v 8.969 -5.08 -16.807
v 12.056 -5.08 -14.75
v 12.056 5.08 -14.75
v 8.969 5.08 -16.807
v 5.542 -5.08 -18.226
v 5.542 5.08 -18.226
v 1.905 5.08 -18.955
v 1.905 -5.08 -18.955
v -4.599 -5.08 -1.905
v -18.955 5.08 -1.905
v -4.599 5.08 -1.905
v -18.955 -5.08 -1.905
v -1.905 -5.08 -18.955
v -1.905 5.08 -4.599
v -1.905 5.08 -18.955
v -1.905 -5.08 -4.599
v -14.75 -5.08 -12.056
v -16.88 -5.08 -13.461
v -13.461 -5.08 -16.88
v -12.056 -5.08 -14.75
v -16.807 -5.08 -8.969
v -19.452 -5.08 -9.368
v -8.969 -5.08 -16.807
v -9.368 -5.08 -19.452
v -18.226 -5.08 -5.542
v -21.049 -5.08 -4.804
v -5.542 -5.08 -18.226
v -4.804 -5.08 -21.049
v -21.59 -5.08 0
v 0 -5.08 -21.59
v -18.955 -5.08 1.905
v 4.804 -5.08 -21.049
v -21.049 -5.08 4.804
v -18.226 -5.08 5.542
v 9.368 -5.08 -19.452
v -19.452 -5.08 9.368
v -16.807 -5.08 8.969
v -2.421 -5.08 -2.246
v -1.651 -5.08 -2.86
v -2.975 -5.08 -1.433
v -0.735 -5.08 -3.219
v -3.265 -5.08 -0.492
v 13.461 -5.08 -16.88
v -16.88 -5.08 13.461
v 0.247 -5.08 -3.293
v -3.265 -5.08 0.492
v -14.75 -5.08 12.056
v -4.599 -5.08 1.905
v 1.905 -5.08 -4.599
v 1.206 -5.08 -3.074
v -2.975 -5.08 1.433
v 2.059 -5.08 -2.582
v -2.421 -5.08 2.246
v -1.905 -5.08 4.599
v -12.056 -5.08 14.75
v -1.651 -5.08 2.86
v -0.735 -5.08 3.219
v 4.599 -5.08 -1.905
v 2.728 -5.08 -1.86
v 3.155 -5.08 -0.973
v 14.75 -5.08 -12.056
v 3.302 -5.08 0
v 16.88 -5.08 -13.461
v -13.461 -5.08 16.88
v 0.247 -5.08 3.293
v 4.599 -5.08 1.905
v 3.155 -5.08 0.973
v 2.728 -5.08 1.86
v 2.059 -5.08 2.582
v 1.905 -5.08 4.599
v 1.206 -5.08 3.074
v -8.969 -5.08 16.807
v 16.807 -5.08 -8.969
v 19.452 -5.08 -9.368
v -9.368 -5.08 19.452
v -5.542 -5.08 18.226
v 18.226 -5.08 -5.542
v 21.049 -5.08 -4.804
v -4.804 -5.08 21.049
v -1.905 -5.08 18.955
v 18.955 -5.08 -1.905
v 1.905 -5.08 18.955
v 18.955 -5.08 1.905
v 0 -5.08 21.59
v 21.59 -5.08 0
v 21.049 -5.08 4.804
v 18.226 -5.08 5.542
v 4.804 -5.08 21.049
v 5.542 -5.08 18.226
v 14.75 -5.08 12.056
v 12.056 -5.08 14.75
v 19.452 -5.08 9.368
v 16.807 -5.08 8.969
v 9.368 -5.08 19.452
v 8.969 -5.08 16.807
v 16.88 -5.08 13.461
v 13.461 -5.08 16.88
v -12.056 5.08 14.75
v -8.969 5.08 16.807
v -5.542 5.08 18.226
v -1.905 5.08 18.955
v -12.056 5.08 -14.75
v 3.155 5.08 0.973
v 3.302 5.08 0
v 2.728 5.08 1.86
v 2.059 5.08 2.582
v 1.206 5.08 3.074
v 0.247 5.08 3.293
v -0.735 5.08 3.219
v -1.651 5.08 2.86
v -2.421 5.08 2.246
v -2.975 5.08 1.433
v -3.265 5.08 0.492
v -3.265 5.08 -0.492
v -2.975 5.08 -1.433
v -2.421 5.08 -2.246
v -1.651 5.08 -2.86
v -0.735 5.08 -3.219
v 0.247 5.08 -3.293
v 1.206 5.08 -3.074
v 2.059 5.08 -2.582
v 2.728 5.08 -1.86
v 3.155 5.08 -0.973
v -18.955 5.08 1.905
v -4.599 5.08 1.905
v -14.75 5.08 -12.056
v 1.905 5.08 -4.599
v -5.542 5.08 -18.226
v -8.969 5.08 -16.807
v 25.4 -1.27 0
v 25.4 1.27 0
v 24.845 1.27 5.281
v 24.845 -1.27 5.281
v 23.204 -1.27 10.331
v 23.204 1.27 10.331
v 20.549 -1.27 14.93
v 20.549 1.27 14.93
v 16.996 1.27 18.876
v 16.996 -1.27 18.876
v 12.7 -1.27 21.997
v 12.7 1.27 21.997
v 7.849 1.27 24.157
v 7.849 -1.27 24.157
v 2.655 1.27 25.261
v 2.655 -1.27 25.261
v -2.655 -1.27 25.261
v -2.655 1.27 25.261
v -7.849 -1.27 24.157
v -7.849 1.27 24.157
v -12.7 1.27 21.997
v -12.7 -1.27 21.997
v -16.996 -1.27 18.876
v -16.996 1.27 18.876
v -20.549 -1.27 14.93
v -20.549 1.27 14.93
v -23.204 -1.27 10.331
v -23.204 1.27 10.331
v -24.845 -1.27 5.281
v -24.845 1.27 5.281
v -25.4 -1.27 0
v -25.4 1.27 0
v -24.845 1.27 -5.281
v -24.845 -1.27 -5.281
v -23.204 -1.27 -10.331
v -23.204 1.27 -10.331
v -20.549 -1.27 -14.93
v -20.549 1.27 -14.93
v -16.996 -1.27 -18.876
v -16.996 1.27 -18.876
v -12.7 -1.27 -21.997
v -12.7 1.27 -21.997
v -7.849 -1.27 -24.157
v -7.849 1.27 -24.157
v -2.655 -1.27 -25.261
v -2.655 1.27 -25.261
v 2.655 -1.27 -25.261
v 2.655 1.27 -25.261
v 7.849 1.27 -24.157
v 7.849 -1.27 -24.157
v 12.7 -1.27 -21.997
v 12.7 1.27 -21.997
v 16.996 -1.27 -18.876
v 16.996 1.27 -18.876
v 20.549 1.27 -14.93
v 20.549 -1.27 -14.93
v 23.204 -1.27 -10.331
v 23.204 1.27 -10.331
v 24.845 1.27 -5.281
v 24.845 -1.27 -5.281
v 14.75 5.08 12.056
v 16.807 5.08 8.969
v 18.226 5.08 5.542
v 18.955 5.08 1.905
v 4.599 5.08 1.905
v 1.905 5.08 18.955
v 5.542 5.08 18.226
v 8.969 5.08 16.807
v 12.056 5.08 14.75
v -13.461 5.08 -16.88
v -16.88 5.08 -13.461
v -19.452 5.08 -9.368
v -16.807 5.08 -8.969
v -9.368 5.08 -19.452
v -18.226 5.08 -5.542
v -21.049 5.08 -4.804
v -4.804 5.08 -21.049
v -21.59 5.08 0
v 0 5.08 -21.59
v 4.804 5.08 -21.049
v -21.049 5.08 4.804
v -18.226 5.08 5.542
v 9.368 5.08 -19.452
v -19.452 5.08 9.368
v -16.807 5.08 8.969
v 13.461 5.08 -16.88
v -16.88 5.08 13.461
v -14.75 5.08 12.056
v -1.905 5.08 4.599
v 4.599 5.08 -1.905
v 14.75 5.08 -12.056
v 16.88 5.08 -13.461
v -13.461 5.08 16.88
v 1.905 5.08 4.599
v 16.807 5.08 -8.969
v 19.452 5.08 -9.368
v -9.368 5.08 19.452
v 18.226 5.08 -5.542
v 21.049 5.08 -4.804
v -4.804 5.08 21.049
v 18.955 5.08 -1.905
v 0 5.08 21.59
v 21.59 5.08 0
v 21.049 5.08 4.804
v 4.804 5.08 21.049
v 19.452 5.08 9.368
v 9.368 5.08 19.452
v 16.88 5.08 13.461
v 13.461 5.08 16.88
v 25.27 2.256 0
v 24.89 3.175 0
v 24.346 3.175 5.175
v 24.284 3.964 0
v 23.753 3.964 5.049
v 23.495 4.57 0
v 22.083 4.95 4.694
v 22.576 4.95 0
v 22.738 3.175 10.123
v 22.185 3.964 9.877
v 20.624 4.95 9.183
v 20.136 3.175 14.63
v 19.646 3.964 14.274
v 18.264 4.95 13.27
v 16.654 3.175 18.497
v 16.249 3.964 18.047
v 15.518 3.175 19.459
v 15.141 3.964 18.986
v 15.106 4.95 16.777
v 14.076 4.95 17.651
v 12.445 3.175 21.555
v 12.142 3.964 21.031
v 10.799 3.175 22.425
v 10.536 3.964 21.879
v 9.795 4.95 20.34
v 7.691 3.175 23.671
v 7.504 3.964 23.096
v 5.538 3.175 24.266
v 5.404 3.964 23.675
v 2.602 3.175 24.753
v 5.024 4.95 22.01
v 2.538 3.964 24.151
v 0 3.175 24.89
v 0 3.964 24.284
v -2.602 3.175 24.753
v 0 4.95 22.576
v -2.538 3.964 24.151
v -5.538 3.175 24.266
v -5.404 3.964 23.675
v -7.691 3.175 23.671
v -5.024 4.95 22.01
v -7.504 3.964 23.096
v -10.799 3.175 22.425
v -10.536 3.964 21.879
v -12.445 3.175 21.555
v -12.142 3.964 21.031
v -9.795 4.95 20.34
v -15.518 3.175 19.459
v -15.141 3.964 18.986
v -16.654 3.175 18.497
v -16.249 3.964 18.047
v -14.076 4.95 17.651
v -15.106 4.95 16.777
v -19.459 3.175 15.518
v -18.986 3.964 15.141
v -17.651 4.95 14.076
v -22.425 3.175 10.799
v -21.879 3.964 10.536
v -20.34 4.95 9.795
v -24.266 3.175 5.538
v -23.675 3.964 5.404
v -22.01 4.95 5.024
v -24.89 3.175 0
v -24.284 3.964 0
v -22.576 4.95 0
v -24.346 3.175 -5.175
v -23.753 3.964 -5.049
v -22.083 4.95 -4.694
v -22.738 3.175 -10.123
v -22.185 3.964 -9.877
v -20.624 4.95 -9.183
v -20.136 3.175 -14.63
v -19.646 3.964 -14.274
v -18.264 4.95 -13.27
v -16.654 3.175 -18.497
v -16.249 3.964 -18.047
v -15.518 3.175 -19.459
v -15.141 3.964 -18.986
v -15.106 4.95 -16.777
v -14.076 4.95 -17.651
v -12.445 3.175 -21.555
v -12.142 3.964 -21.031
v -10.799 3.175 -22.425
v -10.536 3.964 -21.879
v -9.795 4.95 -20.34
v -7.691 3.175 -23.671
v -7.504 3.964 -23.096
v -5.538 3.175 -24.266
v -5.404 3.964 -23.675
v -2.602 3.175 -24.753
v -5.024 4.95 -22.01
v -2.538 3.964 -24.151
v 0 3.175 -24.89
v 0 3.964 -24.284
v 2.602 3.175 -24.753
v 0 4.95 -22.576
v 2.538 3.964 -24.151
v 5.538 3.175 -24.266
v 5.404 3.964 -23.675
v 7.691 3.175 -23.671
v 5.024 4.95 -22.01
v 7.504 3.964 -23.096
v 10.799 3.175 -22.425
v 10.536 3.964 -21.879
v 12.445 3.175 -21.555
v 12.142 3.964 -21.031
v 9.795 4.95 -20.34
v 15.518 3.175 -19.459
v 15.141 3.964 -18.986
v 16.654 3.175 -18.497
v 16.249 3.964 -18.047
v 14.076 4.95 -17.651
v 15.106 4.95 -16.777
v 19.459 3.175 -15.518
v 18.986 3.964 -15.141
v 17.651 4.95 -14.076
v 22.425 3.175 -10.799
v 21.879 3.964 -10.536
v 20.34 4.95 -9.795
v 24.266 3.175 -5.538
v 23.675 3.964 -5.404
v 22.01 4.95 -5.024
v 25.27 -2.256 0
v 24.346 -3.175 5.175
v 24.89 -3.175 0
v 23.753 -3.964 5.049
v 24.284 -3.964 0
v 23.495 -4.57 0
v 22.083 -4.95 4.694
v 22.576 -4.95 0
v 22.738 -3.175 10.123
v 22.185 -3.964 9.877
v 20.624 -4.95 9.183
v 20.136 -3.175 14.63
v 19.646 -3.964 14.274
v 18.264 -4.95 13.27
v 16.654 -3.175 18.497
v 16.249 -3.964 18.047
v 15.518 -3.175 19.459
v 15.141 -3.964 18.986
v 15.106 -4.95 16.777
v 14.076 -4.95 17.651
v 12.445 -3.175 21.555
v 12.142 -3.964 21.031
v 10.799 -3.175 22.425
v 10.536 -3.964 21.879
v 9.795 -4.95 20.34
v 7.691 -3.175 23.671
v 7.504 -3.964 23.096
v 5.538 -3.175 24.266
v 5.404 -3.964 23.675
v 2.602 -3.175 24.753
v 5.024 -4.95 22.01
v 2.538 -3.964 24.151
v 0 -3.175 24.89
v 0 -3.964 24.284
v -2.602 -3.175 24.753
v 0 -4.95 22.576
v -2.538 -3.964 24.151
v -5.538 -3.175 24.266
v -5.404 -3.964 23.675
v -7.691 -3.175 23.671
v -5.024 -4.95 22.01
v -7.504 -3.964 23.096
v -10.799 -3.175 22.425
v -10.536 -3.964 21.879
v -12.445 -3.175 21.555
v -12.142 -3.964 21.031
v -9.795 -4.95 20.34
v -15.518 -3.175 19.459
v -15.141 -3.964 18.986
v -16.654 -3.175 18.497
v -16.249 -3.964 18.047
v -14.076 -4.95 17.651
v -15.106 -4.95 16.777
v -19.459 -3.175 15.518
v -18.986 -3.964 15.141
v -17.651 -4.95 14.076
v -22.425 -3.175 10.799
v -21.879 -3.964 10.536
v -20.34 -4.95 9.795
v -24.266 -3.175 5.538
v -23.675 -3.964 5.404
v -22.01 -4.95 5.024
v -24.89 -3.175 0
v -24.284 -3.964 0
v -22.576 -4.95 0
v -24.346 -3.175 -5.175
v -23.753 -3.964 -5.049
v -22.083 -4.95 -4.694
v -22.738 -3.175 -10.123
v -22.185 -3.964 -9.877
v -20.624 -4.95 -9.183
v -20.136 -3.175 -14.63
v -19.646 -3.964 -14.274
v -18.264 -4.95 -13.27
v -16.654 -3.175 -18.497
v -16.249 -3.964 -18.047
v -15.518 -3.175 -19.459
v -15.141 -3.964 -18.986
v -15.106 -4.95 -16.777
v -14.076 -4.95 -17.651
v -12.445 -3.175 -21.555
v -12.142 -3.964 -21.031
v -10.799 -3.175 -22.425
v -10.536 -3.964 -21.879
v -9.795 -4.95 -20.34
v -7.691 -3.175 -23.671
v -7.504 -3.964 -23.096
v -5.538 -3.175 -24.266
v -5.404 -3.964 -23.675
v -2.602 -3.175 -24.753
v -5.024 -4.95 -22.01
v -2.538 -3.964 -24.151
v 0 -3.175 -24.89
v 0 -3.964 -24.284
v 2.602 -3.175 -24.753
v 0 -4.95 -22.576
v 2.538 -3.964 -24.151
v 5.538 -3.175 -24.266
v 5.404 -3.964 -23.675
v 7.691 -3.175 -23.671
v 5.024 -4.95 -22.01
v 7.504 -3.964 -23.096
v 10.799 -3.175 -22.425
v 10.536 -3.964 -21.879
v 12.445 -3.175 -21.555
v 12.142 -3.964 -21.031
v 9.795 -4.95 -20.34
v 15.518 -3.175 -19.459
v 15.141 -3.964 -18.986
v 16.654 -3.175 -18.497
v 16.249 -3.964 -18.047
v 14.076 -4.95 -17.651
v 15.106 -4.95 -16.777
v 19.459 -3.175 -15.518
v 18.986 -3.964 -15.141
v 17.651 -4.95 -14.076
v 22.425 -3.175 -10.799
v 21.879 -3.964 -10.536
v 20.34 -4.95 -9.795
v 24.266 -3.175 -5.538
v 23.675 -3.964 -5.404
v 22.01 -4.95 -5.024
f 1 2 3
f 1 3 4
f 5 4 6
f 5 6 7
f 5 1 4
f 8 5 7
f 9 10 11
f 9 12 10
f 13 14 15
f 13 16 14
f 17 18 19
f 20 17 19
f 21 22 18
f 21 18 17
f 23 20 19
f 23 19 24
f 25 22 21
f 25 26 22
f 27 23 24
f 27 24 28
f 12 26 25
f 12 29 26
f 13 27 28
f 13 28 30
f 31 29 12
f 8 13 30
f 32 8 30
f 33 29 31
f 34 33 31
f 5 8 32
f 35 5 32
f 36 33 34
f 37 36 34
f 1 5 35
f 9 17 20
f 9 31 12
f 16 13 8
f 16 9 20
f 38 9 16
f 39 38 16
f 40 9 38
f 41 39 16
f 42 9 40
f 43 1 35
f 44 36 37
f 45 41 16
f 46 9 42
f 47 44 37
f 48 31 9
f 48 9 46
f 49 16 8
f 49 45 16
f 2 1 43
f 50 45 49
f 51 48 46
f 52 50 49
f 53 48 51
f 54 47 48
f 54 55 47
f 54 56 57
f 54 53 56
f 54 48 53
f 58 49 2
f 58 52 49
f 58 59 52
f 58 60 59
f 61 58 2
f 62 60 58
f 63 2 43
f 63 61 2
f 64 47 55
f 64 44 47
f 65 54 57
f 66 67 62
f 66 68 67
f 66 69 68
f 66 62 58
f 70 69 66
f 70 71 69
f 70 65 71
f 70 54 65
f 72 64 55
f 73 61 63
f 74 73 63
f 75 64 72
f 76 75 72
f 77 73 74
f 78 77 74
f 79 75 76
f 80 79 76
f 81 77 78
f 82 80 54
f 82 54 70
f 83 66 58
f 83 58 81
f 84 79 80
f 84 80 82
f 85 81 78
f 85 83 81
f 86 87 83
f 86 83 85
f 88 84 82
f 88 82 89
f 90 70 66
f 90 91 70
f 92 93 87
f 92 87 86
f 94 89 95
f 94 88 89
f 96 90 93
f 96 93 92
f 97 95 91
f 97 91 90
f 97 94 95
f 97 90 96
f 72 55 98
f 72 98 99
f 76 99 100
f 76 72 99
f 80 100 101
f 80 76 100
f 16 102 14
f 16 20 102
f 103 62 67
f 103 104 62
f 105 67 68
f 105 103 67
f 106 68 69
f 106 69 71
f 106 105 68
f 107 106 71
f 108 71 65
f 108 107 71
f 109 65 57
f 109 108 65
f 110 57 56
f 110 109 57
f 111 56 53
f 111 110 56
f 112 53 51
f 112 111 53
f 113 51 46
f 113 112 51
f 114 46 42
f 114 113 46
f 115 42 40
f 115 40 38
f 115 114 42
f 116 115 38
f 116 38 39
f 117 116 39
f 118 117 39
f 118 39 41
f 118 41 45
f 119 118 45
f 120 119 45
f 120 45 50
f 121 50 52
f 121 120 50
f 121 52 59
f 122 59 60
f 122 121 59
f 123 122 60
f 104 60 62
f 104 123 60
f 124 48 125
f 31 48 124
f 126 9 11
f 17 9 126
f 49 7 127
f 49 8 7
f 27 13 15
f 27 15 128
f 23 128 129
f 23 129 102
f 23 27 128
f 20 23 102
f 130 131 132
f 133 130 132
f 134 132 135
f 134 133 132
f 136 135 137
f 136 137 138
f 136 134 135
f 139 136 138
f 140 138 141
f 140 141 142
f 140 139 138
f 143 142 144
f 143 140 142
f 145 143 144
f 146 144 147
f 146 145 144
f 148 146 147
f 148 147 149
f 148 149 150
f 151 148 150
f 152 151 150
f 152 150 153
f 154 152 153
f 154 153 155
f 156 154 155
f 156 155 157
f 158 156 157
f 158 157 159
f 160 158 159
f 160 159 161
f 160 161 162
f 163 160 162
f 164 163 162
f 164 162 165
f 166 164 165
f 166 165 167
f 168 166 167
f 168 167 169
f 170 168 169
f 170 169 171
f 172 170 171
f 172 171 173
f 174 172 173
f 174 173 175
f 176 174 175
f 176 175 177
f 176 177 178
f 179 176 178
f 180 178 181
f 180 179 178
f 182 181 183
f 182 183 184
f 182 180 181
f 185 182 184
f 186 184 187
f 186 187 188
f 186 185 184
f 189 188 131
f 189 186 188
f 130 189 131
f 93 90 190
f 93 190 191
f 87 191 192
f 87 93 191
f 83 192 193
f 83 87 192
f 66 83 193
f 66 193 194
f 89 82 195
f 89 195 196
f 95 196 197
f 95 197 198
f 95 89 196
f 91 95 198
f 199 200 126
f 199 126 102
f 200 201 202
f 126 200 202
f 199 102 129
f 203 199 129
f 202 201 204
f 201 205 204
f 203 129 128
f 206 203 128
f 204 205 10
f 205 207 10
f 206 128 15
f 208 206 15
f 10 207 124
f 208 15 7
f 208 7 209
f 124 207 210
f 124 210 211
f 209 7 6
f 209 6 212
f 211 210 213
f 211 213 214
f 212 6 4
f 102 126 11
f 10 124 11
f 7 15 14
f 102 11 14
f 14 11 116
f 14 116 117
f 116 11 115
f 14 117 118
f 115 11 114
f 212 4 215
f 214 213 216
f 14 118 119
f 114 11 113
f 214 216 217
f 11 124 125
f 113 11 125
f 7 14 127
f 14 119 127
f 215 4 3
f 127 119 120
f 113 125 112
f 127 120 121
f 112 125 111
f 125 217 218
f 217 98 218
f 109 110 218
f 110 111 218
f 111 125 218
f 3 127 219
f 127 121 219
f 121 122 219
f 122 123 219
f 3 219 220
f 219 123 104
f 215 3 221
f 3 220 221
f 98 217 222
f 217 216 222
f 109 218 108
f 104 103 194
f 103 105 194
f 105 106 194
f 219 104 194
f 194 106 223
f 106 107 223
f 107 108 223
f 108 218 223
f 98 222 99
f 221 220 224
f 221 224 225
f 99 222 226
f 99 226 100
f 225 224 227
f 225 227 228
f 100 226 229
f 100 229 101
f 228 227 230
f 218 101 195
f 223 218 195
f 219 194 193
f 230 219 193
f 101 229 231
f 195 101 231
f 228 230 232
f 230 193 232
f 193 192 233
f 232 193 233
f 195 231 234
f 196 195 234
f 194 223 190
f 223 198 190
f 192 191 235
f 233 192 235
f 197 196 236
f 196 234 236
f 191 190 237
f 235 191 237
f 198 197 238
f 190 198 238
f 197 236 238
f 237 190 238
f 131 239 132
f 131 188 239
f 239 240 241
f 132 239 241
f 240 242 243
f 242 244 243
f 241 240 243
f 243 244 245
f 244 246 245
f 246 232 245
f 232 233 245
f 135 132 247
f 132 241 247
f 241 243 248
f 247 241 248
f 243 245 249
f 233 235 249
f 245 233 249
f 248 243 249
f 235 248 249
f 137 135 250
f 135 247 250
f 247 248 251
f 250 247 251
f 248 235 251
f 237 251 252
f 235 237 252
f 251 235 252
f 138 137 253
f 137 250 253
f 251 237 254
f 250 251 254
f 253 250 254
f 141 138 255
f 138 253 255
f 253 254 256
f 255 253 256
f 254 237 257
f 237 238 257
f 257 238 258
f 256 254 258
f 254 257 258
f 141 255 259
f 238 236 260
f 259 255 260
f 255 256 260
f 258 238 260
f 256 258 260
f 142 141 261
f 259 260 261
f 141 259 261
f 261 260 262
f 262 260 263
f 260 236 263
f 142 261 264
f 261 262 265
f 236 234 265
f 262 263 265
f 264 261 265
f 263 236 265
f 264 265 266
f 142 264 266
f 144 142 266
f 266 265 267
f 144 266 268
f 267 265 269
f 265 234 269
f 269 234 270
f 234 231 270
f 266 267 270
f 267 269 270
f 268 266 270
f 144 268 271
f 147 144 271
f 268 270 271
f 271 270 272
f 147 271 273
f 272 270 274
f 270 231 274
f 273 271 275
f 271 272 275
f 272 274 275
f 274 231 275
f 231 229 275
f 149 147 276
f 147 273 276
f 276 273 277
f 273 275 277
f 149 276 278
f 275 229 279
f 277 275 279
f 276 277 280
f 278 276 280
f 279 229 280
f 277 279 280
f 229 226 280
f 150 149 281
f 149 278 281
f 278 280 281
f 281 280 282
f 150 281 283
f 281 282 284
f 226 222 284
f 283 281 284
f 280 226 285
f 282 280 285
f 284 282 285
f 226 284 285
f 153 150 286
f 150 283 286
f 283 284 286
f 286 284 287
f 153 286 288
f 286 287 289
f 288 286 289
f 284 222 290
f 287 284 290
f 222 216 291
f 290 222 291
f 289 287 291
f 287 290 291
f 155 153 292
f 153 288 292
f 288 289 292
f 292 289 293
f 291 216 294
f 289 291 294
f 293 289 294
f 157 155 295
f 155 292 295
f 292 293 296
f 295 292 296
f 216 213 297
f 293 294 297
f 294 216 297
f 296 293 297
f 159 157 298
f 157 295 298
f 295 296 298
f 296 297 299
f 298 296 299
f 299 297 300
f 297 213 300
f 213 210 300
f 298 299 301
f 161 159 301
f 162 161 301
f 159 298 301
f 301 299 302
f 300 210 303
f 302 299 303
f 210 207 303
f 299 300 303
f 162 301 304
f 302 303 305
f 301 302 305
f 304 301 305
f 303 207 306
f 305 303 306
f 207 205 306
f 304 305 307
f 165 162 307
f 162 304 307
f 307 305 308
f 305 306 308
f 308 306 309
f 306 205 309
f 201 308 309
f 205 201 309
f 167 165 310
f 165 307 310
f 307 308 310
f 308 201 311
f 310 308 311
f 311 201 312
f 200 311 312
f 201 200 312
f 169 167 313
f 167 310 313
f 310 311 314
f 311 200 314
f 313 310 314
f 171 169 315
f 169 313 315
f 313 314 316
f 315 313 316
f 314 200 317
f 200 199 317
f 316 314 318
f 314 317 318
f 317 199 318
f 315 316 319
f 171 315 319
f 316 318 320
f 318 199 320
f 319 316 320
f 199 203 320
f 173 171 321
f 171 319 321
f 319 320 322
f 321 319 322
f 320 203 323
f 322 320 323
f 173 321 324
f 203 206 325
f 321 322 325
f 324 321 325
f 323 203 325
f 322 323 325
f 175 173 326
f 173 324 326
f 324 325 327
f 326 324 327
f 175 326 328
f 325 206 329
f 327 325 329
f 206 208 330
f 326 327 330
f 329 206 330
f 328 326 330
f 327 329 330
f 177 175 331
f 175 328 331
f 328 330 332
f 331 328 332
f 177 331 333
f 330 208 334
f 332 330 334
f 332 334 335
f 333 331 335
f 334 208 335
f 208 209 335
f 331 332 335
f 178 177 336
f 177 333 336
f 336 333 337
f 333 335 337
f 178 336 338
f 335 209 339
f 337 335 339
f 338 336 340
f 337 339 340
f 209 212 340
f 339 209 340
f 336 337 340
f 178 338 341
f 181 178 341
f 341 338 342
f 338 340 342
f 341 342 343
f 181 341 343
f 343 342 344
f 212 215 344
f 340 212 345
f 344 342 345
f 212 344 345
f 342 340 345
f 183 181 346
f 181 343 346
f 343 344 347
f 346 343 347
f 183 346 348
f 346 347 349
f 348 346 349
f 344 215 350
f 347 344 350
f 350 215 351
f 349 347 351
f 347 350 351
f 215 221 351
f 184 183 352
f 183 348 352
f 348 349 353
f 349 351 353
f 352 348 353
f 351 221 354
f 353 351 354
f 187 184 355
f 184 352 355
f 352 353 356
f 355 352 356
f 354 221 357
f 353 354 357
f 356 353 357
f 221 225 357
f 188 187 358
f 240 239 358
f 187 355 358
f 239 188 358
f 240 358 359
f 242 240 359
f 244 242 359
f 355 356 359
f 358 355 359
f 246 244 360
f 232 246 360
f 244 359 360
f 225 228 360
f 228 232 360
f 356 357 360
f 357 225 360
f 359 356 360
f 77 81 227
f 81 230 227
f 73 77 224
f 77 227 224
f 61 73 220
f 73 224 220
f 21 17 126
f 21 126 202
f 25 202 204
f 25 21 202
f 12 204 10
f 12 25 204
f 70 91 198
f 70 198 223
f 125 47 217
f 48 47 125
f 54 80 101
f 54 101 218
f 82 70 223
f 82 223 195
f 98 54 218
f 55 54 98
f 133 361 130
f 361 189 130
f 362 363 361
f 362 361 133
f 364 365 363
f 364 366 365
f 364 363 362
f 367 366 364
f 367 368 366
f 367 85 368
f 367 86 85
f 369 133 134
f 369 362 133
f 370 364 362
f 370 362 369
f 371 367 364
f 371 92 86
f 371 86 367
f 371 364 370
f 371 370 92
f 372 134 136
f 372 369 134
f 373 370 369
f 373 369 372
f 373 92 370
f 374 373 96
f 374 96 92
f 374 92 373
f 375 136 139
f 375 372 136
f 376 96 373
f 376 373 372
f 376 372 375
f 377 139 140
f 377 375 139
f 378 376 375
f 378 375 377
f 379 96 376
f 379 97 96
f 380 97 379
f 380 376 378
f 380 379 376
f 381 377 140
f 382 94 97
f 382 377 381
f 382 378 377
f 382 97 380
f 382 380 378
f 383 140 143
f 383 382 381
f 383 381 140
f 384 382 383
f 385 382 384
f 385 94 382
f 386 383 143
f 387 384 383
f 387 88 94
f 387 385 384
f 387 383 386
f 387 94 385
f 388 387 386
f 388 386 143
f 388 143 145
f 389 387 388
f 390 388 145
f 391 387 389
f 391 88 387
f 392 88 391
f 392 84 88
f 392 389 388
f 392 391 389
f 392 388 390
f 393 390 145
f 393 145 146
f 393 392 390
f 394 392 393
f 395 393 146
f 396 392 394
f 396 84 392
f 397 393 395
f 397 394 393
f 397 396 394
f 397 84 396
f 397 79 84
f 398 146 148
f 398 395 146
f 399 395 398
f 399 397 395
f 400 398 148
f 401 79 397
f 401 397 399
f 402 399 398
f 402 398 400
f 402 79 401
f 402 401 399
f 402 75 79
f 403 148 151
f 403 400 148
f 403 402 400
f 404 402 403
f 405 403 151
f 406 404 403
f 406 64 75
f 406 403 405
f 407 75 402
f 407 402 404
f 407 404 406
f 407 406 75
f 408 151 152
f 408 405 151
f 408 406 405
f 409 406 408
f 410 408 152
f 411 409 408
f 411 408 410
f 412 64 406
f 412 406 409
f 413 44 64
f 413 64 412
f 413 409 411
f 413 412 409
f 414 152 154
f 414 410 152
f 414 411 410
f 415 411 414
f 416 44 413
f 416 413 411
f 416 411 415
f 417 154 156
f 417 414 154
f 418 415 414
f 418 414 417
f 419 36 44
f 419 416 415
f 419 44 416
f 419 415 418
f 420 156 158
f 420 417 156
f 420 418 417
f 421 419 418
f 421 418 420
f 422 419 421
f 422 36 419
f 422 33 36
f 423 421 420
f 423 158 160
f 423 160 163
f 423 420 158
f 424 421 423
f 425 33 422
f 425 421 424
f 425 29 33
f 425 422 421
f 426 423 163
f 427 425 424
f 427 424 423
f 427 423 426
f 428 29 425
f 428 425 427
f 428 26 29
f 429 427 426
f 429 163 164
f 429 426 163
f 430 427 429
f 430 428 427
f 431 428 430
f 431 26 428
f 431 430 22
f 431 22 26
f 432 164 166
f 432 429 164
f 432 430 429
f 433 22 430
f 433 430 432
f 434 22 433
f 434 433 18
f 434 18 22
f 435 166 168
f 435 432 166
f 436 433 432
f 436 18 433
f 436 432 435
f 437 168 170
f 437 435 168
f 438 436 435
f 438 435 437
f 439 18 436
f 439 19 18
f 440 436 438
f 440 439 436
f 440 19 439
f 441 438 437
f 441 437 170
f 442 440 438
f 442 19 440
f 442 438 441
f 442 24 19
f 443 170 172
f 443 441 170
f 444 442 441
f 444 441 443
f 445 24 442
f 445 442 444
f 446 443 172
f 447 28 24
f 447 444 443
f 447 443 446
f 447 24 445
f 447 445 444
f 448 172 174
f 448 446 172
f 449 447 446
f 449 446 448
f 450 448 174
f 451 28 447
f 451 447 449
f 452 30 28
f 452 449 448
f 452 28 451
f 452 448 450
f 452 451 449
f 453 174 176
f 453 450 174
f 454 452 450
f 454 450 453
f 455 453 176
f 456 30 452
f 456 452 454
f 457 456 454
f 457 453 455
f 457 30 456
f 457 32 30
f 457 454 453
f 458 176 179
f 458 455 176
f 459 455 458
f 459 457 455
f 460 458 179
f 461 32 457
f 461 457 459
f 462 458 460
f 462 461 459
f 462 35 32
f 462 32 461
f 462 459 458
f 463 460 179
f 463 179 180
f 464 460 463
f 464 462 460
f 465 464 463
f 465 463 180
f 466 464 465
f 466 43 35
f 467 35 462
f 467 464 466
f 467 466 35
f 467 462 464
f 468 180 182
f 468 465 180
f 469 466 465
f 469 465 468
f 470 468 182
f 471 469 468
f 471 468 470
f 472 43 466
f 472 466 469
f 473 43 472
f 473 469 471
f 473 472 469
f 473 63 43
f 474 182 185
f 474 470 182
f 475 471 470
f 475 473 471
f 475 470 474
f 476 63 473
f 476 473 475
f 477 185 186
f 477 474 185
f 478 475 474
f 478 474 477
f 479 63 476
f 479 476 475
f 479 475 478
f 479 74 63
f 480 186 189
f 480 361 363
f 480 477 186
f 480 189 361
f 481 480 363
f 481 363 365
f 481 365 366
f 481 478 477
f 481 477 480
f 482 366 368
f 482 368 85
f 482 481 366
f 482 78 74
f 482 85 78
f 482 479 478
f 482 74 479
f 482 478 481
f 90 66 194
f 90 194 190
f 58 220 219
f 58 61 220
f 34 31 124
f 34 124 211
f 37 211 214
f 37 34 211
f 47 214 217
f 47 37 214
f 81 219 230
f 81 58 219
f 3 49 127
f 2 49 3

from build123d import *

# Parameters (mm, degrees)
F0_R     = 25.4
F1_DEPTH = 5.08
F2_R     = 3.81
F0_R_2   = 3.302
F3_DEPTH = 5.08


with BuildPart() as f1:
    # F0 (on Front) → F1 (new body, symmetric)
    with BuildSketch(Plane.XZ):
        Circle(F0_R)
        with BuildLine():
            ThreePointArc((18.9545106806, 1.9049999628), (19.0261126937, 0.9536958462), (19.05, 0))
            ThreePointArc((19.05, 0), (19.0261128131, -0.9536934636), (18.9545111577, -1.9049952154))
            ThreePointArc((18.9545111577, -1.9049952154), (17.5999062473, -7.2901166031), (14.749902222, -12.0558236733))
            ThreePointArc((14.749902222, -12.0558236733), (13.4703854002, -13.4703829631), (12.0558263419, -14.7499000408))
            ThreePointArc((12.0558263419, -14.7499000408), (7.2901213153, -17.5999042954), (1.905001936, -18.9545104823))
            ThreePointArc((1.905001936, -18.9545104823), (1.3528e-06, -19.05), (-1.904999244, -18.9545107529))
            ThreePointArc((-1.904999244, -18.9545107529), (-7.2901189565, -17.5999052725), (-12.055824483, -14.7499015601))
            ThreePointArc((-12.055824483, -14.7499015601), (-13.4703841719, -13.4703841913), (-14.7499015428, -12.0558245042))
            ThreePointArc((-14.7499015428, -12.0558245042), (-17.5999039961, -7.2901220379), (-18.9545100886, -1.9050058538))
            ThreePointArc((-18.9545100886, -1.9050058538), (-19.05, -2.3188e-06), (-18.9545105523, 1.9050012395))
            ThreePointArc((-18.9545105523, 1.9050012395), (-17.5999046178, 7.290120537), (-14.7499006641, 12.0558255794))
            ThreePointArc((-14.7499006641, 12.0558255794), (-13.4703834119, 13.4703849513), (-12.0558238937, 14.7499020418))
            ThreePointArc((-12.0558238937, 14.7499020418), (-7.2901186049, 17.5999054181), (-1.904999244, 18.9545107529))
            ThreePointArc((-1.904999244, 18.9545107529), (-2.13e-07, 19.05), (1.9049988201, 18.9545107955))
            ThreePointArc((1.9049988201, 18.9545107955), (7.2901186408, 17.5999054032), (12.0558242838, 14.749901723))
            ThreePointArc((12.0558242838, 14.749901723), (13.4703837424, 13.4703846208), (14.7499009369, 12.0558252456))
            ThreePointArc((14.7499009369, 12.0558252456), (17.5999049458, 7.2901197452), (18.9545106806, 1.9049999628))
        make_face(mode=Mode.SUBTRACT)
    extrude(amount=F1_DEPTH, both=True)

    # F2
    f2_edges = [f1.edges().sort_by_distance(p)[0] for p in [
        (-25.4, 5.08, 0),
        (-25.4, -5.08, 0),
    ]]
    fillet(f2_edges, radius=F2_R)

    # F0 (on Front) → F3 (join, symmetric)
    with BuildSketch(Plane.XZ):
        with BuildLine():
            ThreePointArc((18.9545111577, -1.9049952154), (19.0261128131, -0.9536934636), (19.05, 0))
            ThreePointArc((19.05, 0), (19.0261126937, 0.9536958462), (18.9545106806, 1.9049999628))
            Line((18.9545106806, 1.9049999628), (4.5990766623, 1.9050004462))
            Line((4.5990766623, 1.9050004462), (14.7499009369, 12.0558252456))
            ThreePointArc((14.7499009369, 12.0558252456), (13.4703837424, 13.4703846208), (12.0558242838, 14.749901723))
            Line((12.0558242838, 14.749901723), (1.905, 4.5990772875))
            Line((1.905, 4.5990772875), (1.9049988201, 18.9545107955))
            ThreePointArc((1.9049988201, 18.9545107955), (-2.13e-07, 19.05), (-1.904999244, 18.9545107529))
            Line((-1.904999244, 18.9545107529), (-1.904999244, 4.5990775438))
            Line((-1.904999244, 4.5990775438), (-12.0558238937, 14.7499020418))
            ThreePointArc((-12.0558238937, 14.7499020418), (-13.4703834119, 13.4703849513), (-14.7499006641, 12.0558255794))
            Line((-14.7499006641, 12.0558255794), (-4.599075316, 1.905000756))
            Line((-4.599075316, 1.905000756), (-18.9545105523, 1.9050012395))
            ThreePointArc((-18.9545105523, 1.9050012395), (-19.05, -2.3188e-06), (-18.9545100886, -1.9050058538))
            Line((-18.9545100886, -1.9050058538), (-4.5990790156, -1.9050018252))
            Line((-4.5990790156, -1.9050018252), (-14.7499015428, -12.0558245042))
            ThreePointArc((-14.7499015428, -12.0558245042), (-13.4703841719, -13.4703841913), (-12.055824483, -14.7499015601))
            Line((-12.055824483, -14.7499015601), (-1.904999244, -4.5990757963))
            Line((-1.904999244, -4.5990757963), (-1.904999244, -18.9545107529))
            ThreePointArc((-1.904999244, -18.9545107529), (1.3528e-06, -19.05), (1.905001936, -18.9545104823))
            Line((1.905001936, -18.9545104823), (1.905000756, -4.5990749797))
            Line((1.905000756, -4.5990749797), (12.0558263419, -14.7499000408))
            ThreePointArc((12.0558263419, -14.7499000408), (13.4703854002, -13.4703829631), (14.749902222, -12.0558236733))
            Line((14.749902222, -12.0558236733), (4.599077641, -1.904999244))
            Line((4.599077641, -1.904999244), (18.9545111577, -1.9049952154))
        make_face()
        Circle(F0_R_2, mode=Mode.SUBTRACT)
    extrude(amount=F3_DEPTH, both=True)


solid = f1.part
